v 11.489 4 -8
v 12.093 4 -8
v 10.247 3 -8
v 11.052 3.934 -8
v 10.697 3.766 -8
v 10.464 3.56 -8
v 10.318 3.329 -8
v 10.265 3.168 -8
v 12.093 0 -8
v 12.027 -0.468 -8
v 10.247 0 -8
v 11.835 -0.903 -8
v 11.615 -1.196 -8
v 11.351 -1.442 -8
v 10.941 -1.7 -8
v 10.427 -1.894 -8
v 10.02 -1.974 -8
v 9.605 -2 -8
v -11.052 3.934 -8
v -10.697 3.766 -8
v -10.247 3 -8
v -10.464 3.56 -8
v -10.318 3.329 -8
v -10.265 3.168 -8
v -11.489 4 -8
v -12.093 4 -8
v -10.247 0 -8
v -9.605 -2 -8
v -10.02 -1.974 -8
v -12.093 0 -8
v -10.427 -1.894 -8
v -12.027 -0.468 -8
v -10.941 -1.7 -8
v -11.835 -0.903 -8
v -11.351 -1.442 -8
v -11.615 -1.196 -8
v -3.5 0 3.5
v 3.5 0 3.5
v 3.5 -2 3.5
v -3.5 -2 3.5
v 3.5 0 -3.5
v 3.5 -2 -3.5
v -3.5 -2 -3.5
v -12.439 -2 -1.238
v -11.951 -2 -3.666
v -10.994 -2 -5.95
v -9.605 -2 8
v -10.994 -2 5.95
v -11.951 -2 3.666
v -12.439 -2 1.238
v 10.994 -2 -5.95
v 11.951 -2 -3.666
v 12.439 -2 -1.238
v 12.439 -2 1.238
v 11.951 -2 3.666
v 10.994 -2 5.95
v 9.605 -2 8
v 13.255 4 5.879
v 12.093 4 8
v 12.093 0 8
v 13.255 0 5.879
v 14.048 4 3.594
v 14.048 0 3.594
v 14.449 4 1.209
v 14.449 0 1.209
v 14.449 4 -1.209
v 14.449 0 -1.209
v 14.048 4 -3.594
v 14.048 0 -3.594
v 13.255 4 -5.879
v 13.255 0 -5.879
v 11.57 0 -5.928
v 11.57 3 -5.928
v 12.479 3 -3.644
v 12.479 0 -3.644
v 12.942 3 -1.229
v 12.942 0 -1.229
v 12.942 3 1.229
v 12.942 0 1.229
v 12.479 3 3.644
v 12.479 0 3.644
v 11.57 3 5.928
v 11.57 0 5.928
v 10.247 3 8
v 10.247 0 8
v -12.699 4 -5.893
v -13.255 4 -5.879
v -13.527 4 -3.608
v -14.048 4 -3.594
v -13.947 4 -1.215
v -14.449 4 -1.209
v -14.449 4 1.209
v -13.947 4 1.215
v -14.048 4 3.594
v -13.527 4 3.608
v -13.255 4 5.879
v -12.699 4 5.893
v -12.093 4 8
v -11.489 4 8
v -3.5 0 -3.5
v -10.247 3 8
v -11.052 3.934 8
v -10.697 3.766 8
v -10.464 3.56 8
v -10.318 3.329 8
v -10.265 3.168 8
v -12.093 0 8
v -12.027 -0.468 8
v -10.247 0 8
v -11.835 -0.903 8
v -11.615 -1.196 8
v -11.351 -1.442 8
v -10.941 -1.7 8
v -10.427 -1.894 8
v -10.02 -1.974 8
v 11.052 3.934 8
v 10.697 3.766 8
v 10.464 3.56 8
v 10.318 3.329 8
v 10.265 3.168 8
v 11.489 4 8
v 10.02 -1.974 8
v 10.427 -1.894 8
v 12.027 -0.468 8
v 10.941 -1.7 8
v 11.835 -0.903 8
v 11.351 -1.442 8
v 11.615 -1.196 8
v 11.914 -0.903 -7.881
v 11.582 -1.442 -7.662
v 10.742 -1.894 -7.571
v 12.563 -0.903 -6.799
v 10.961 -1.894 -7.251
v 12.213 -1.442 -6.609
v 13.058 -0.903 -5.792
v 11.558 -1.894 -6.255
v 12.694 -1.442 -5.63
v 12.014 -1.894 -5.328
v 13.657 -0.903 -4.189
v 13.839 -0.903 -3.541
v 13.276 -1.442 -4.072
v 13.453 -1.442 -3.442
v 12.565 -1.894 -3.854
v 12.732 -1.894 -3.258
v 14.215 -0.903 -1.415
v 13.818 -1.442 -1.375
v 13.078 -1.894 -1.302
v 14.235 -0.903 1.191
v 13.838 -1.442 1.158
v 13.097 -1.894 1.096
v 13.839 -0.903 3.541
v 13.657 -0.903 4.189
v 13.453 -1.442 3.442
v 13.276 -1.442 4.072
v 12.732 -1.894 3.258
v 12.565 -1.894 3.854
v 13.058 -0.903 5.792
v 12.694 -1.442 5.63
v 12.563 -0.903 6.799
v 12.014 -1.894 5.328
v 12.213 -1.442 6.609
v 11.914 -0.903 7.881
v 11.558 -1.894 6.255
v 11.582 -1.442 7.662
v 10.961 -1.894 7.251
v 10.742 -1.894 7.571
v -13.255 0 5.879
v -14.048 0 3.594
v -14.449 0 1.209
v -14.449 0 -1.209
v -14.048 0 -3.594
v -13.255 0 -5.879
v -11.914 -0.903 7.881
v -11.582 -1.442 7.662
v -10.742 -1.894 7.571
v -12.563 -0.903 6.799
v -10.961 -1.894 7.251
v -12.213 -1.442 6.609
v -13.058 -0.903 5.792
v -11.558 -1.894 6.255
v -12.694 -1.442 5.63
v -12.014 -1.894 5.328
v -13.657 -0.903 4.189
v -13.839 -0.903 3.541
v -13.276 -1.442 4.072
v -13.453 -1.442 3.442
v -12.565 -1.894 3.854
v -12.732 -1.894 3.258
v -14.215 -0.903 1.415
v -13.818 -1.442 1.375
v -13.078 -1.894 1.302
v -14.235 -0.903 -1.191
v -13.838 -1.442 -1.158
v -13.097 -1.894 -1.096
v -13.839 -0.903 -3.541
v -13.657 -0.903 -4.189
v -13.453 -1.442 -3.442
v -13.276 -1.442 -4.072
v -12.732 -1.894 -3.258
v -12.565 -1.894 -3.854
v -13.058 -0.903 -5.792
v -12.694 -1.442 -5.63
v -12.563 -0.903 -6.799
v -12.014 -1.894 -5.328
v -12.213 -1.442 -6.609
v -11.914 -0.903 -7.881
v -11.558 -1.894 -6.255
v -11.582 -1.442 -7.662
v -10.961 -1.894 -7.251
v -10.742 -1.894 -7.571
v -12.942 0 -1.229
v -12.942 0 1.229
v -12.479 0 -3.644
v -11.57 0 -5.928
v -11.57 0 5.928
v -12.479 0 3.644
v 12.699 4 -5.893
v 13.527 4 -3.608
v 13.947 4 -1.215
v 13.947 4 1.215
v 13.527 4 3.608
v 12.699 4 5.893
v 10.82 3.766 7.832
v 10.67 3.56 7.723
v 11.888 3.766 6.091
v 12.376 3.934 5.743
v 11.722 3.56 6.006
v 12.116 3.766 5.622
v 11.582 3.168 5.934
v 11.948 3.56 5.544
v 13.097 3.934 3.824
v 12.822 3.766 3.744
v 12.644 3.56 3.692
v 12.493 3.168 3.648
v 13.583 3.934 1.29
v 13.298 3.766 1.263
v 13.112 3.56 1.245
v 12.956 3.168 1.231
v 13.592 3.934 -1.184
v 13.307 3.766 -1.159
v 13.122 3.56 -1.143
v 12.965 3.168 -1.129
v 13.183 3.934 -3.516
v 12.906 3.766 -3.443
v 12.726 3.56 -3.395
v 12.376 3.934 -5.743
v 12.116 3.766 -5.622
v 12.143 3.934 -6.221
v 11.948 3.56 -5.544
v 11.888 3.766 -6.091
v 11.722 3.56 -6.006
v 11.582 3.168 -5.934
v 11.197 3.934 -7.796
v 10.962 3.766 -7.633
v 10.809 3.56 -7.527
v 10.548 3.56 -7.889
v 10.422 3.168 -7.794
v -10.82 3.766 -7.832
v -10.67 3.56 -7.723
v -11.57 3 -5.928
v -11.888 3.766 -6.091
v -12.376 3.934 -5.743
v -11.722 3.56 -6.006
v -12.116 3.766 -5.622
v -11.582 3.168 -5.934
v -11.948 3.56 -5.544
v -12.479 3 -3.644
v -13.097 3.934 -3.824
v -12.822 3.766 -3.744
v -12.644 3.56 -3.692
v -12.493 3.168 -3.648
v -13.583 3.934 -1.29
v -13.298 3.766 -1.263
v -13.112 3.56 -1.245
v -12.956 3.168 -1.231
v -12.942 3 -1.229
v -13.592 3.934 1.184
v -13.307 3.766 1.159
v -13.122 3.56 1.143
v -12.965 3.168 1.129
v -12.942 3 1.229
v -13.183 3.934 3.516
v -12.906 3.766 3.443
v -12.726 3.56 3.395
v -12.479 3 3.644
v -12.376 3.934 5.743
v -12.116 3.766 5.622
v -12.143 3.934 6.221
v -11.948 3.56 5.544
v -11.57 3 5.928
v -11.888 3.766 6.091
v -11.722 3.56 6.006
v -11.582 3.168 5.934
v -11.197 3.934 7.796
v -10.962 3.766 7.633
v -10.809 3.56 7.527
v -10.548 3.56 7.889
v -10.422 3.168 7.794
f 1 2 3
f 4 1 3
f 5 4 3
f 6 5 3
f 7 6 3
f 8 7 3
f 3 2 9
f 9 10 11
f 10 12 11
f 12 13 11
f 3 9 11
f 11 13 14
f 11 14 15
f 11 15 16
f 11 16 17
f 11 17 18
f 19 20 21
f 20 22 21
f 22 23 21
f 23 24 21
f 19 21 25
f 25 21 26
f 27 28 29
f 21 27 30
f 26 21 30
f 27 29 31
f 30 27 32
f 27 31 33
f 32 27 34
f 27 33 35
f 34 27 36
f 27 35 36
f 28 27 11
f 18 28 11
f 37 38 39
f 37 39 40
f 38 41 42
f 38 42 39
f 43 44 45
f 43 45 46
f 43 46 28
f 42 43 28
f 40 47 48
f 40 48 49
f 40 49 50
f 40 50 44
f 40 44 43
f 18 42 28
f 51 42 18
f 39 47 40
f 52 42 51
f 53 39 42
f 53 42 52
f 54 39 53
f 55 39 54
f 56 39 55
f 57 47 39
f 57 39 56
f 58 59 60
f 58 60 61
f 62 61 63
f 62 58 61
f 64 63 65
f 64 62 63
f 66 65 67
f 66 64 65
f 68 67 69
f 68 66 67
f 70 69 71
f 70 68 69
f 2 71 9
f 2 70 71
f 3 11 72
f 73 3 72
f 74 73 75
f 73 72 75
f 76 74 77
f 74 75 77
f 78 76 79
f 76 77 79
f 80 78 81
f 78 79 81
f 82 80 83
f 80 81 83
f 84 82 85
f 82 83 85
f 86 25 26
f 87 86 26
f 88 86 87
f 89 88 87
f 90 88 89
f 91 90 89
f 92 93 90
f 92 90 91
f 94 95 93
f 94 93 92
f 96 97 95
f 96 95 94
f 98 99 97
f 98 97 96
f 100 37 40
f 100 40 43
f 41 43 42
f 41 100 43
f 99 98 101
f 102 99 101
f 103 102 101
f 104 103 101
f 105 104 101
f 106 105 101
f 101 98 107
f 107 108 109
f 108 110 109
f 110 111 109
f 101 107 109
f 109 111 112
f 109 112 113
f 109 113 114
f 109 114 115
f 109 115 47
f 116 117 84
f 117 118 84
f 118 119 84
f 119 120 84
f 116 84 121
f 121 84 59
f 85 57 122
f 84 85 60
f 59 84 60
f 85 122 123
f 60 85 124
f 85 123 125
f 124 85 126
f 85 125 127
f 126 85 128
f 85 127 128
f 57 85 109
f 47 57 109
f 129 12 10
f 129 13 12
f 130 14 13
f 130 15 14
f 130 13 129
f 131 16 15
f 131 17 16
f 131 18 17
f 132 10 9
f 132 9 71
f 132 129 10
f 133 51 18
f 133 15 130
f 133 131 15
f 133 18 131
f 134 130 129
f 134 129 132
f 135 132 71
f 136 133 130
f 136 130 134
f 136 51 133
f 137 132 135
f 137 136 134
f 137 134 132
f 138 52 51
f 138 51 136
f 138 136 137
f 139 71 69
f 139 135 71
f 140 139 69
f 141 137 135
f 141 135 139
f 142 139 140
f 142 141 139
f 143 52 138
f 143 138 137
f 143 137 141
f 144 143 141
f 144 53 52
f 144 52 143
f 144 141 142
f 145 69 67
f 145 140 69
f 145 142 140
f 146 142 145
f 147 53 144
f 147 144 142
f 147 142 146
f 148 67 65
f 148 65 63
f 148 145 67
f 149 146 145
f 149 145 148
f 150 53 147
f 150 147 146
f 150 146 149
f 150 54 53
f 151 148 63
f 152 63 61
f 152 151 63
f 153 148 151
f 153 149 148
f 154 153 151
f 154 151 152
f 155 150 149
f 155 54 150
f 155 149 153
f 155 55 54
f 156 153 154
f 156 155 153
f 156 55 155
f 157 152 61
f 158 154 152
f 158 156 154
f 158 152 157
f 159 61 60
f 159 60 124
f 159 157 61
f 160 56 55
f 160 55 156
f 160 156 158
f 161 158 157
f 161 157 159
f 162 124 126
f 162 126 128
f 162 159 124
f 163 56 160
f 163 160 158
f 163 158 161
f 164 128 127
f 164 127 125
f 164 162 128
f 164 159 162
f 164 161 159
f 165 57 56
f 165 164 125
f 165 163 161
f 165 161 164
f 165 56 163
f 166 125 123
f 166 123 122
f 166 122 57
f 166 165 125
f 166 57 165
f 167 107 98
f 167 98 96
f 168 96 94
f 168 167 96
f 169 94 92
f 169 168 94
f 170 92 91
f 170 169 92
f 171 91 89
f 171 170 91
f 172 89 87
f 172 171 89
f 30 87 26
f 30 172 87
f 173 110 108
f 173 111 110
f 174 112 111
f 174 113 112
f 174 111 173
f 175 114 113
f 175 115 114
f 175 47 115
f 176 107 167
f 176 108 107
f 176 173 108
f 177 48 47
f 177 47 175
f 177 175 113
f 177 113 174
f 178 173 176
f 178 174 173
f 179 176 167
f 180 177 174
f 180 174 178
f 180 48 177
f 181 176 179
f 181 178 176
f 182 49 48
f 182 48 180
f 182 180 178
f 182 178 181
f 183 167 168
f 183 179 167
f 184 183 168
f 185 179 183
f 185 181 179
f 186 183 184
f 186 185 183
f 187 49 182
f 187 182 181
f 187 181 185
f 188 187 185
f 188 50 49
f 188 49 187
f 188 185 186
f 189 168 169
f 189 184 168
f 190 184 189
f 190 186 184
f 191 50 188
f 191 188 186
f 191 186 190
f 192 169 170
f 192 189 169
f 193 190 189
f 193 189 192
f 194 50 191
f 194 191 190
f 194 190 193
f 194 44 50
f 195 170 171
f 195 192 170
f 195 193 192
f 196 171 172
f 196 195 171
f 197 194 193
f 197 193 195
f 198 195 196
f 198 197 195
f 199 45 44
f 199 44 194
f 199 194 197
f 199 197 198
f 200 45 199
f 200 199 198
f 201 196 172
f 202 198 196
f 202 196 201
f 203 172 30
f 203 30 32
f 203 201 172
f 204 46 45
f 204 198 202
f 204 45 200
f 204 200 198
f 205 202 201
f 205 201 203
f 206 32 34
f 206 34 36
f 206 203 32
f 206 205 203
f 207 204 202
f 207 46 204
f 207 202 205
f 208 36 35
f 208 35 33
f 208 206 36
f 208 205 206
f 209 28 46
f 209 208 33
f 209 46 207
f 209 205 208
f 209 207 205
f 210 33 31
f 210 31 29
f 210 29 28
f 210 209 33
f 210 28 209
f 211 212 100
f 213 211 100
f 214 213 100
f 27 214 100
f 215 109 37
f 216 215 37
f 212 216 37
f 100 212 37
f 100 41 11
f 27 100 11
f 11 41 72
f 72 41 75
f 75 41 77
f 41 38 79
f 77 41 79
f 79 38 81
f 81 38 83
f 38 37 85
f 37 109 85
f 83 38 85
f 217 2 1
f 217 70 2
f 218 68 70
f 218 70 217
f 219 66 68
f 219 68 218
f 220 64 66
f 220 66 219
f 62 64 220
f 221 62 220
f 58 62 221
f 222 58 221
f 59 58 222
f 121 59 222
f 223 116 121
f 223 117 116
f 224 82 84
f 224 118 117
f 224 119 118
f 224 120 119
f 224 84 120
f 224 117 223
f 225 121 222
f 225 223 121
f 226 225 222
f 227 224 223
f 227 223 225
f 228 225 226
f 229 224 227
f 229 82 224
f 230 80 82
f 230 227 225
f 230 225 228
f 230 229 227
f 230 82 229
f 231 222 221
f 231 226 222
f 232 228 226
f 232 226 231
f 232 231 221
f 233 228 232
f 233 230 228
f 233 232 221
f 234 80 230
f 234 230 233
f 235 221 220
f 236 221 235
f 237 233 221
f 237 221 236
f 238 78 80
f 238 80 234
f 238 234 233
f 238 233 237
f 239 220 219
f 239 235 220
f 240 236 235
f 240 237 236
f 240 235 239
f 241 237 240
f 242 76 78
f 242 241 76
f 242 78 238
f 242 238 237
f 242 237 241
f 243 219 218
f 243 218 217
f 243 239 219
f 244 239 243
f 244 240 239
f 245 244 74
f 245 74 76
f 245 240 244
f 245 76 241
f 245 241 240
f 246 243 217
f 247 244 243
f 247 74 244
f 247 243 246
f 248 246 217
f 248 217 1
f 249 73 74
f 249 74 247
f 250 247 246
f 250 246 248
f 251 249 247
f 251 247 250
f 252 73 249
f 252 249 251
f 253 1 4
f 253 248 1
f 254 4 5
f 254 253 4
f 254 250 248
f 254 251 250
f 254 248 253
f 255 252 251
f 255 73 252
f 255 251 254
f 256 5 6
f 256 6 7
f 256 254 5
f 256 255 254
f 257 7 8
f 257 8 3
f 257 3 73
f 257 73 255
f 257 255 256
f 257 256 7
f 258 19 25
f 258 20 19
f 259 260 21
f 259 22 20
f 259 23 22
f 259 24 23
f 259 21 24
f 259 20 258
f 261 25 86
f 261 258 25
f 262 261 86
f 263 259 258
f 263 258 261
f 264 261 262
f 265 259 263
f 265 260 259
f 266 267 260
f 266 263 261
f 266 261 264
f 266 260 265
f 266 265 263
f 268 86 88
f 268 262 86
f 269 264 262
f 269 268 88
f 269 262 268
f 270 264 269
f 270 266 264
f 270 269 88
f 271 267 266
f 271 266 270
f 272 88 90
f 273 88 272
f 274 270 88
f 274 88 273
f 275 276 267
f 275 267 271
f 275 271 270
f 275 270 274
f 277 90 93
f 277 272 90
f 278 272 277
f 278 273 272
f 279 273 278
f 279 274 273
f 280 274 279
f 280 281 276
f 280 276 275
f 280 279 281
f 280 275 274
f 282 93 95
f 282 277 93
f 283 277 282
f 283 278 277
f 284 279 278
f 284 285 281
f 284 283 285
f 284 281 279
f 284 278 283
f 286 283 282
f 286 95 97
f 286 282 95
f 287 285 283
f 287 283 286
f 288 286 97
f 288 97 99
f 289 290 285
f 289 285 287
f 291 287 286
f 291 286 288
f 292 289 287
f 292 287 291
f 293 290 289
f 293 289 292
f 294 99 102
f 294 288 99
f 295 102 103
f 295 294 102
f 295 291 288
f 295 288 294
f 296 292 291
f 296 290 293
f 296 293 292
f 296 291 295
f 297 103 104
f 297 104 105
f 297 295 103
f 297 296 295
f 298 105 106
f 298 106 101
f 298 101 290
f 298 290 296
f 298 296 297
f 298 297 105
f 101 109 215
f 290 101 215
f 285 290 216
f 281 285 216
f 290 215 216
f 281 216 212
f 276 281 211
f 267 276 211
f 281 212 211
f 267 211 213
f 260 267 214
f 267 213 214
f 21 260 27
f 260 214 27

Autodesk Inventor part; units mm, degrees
ref_plane "YZ Plane" through (0, 0, 0) normal (1, 0, 0) x (0, 1, 0)
ref_plane "XZ Plane" through (0, 0, 0) normal (0, 1, 0) x (-1, 0, 0)
ref_plane "XY Plane" through (0, 0, 0) normal (0, 0, 1) x (1, 0, 0)
sketch "Sketch1" plane through (0, 0, 0) normal (0, 1, 0) x (-1, 0, 0)
  circle A0 centre (0, 0) radius 13
  circle A1 centre (0, 0) radius 14.5
  dimension "d0" = 26
  dimension "d1" = 29
extrude "Extrusion1" add sketch "Sketch1" along normal blind 4
sketch "Sketch2" plane through (0, 0, 0) normal (0, -1, 0) x (1, 0, 0)
  circle A0 centre (0, 0) radius 14.5
  dimension "d4" = 29
extrude "Extrusion2" add sketch "Sketch2" along normal blind 2
sketch "Sketch3" plane through (0, 0, 0) normal (0, 1, 0) x (1, 0, 0)
  line L0 (-3.5, 3.5) -> (3.5, 3.5)
  line L1 (3.5, 3.5) -> (3.5, -3.5)
  line L2 (3.5, -3.5) -> (-3.5, -3.5)
  line L3 (-3.5, -3.5) -> (-3.5, 3.5)
  line L4 (-3.5, 3.5) -> (3.5, -3.5) construction
  line L5 (3.5, 3.5) -> (-3.5, -3.5) construction
  point P0 (0, 0)
  dimension "d7" = 7
  dimension "d8" = 7
extrude "Extrusion3" cut sketch "Sketch3" against normal blind 3
fillet "Fillet1" radius 2 1 edges at (-14.5, -2, 0)
fillet "Fillet2" radius 1 1 edges at (13, 4, 0)
sketch "Sketch4" plane through (0, 0, 0) normal (0, 1, 0) x (1, 0, 0)
  line L0 (0, 0) -> (0, -8)
  line L1 (0, 0) -> (0, 8)
  line L2 (0, 8) -> (16, 8)
  line L3 (16, 8) -> (16, 16)
  line L4 (0, 8) -> (0, 12)
  line L5 (0, 8) -> (4, 8) construction
  line L6 (-16, 16) -> (16, 16)
  line L7 (16, 16) -> (16, 8)
  line L8 (16, 8) -> (-16, 8)
  line L9 (-16, 8) -> (-16, 16)
  line L10 (-16, 16) -> (16, 8) construction
  line L11 (16, 16) -> (-16, 8) construction
  line L12 (0, -8) -> (0, -12)
  line L13 (-16, -8) -> (16, -8)
  line L14 (16, -8) -> (16, -16)
  line L15 (16, -16) -> (-16, -16)
  line L16 (-16, -16) -> (-16, -8)
  line L17 (-16, -8) -> (16, -16) construction
  line L18 (16, -8) -> (-16, -16) construction
  dimension "d13" = 8
  dimension "d14" = 8
  dimension "d15" = 16
  dimension "d16" = 8
  dimension "d17" = 4
  dimension "d18" = 90
  dimension "d19" = 4
  dimension "d20" = 32
  dimension "d21" = 8
extrude "Extrusion4" cut sketch "Sketch4" along normal mid plane 20
properties part number "Battery_Holder"
